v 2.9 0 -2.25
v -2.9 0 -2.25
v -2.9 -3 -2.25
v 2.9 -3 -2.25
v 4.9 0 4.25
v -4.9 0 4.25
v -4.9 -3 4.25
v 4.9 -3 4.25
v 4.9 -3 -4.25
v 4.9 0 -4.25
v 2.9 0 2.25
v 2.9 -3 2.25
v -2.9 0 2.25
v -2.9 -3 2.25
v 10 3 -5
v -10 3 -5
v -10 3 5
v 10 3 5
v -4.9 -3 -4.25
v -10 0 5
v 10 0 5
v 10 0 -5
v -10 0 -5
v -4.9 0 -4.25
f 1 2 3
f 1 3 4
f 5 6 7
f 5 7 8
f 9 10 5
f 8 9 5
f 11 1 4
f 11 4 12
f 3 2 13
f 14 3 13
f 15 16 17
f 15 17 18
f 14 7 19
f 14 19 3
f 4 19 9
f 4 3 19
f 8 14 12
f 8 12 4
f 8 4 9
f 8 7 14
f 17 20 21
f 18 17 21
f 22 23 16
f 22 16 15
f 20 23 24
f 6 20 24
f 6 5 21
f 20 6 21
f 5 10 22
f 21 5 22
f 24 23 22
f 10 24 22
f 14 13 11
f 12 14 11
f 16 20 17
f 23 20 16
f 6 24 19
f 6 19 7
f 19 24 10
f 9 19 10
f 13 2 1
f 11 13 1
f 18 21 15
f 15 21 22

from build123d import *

# Parameters (mm, degrees)
SKETCH1_W           = 20
SKETCH1_H           = 10
BOSS_EXTRUDE1_DEPTH = 3
SKETCH2_W           = 9.8
SKETCH2_H           = 8.5
SKETCH2_W_2         = 5.8
SKETCH2_H_2         = 4.5
BOSS_EXTRUDE2_DEPTH = 3


with BuildPart() as part:
    # Sketch1 → Boss-Extrude1 (new body)
    with BuildSketch(Plane(origin=(0, 0, 0), x_dir=(1, 0, 0), z_dir=(0, 1, 0))):
        Rectangle(SKETCH1_W, SKETCH1_H)
    extrude(amount=BOSS_EXTRUDE1_DEPTH)

    # Sketch2 → Boss-Extrude2 (add)
    with BuildSketch(Plane.XZ):
        Rectangle(SKETCH2_W, SKETCH2_H)
        Rectangle(SKETCH2_W_2, SKETCH2_H_2, mode=Mode.SUBTRACT)
    extrude(amount=BOSS_EXTRUDE2_DEPTH)


solid = part.part
